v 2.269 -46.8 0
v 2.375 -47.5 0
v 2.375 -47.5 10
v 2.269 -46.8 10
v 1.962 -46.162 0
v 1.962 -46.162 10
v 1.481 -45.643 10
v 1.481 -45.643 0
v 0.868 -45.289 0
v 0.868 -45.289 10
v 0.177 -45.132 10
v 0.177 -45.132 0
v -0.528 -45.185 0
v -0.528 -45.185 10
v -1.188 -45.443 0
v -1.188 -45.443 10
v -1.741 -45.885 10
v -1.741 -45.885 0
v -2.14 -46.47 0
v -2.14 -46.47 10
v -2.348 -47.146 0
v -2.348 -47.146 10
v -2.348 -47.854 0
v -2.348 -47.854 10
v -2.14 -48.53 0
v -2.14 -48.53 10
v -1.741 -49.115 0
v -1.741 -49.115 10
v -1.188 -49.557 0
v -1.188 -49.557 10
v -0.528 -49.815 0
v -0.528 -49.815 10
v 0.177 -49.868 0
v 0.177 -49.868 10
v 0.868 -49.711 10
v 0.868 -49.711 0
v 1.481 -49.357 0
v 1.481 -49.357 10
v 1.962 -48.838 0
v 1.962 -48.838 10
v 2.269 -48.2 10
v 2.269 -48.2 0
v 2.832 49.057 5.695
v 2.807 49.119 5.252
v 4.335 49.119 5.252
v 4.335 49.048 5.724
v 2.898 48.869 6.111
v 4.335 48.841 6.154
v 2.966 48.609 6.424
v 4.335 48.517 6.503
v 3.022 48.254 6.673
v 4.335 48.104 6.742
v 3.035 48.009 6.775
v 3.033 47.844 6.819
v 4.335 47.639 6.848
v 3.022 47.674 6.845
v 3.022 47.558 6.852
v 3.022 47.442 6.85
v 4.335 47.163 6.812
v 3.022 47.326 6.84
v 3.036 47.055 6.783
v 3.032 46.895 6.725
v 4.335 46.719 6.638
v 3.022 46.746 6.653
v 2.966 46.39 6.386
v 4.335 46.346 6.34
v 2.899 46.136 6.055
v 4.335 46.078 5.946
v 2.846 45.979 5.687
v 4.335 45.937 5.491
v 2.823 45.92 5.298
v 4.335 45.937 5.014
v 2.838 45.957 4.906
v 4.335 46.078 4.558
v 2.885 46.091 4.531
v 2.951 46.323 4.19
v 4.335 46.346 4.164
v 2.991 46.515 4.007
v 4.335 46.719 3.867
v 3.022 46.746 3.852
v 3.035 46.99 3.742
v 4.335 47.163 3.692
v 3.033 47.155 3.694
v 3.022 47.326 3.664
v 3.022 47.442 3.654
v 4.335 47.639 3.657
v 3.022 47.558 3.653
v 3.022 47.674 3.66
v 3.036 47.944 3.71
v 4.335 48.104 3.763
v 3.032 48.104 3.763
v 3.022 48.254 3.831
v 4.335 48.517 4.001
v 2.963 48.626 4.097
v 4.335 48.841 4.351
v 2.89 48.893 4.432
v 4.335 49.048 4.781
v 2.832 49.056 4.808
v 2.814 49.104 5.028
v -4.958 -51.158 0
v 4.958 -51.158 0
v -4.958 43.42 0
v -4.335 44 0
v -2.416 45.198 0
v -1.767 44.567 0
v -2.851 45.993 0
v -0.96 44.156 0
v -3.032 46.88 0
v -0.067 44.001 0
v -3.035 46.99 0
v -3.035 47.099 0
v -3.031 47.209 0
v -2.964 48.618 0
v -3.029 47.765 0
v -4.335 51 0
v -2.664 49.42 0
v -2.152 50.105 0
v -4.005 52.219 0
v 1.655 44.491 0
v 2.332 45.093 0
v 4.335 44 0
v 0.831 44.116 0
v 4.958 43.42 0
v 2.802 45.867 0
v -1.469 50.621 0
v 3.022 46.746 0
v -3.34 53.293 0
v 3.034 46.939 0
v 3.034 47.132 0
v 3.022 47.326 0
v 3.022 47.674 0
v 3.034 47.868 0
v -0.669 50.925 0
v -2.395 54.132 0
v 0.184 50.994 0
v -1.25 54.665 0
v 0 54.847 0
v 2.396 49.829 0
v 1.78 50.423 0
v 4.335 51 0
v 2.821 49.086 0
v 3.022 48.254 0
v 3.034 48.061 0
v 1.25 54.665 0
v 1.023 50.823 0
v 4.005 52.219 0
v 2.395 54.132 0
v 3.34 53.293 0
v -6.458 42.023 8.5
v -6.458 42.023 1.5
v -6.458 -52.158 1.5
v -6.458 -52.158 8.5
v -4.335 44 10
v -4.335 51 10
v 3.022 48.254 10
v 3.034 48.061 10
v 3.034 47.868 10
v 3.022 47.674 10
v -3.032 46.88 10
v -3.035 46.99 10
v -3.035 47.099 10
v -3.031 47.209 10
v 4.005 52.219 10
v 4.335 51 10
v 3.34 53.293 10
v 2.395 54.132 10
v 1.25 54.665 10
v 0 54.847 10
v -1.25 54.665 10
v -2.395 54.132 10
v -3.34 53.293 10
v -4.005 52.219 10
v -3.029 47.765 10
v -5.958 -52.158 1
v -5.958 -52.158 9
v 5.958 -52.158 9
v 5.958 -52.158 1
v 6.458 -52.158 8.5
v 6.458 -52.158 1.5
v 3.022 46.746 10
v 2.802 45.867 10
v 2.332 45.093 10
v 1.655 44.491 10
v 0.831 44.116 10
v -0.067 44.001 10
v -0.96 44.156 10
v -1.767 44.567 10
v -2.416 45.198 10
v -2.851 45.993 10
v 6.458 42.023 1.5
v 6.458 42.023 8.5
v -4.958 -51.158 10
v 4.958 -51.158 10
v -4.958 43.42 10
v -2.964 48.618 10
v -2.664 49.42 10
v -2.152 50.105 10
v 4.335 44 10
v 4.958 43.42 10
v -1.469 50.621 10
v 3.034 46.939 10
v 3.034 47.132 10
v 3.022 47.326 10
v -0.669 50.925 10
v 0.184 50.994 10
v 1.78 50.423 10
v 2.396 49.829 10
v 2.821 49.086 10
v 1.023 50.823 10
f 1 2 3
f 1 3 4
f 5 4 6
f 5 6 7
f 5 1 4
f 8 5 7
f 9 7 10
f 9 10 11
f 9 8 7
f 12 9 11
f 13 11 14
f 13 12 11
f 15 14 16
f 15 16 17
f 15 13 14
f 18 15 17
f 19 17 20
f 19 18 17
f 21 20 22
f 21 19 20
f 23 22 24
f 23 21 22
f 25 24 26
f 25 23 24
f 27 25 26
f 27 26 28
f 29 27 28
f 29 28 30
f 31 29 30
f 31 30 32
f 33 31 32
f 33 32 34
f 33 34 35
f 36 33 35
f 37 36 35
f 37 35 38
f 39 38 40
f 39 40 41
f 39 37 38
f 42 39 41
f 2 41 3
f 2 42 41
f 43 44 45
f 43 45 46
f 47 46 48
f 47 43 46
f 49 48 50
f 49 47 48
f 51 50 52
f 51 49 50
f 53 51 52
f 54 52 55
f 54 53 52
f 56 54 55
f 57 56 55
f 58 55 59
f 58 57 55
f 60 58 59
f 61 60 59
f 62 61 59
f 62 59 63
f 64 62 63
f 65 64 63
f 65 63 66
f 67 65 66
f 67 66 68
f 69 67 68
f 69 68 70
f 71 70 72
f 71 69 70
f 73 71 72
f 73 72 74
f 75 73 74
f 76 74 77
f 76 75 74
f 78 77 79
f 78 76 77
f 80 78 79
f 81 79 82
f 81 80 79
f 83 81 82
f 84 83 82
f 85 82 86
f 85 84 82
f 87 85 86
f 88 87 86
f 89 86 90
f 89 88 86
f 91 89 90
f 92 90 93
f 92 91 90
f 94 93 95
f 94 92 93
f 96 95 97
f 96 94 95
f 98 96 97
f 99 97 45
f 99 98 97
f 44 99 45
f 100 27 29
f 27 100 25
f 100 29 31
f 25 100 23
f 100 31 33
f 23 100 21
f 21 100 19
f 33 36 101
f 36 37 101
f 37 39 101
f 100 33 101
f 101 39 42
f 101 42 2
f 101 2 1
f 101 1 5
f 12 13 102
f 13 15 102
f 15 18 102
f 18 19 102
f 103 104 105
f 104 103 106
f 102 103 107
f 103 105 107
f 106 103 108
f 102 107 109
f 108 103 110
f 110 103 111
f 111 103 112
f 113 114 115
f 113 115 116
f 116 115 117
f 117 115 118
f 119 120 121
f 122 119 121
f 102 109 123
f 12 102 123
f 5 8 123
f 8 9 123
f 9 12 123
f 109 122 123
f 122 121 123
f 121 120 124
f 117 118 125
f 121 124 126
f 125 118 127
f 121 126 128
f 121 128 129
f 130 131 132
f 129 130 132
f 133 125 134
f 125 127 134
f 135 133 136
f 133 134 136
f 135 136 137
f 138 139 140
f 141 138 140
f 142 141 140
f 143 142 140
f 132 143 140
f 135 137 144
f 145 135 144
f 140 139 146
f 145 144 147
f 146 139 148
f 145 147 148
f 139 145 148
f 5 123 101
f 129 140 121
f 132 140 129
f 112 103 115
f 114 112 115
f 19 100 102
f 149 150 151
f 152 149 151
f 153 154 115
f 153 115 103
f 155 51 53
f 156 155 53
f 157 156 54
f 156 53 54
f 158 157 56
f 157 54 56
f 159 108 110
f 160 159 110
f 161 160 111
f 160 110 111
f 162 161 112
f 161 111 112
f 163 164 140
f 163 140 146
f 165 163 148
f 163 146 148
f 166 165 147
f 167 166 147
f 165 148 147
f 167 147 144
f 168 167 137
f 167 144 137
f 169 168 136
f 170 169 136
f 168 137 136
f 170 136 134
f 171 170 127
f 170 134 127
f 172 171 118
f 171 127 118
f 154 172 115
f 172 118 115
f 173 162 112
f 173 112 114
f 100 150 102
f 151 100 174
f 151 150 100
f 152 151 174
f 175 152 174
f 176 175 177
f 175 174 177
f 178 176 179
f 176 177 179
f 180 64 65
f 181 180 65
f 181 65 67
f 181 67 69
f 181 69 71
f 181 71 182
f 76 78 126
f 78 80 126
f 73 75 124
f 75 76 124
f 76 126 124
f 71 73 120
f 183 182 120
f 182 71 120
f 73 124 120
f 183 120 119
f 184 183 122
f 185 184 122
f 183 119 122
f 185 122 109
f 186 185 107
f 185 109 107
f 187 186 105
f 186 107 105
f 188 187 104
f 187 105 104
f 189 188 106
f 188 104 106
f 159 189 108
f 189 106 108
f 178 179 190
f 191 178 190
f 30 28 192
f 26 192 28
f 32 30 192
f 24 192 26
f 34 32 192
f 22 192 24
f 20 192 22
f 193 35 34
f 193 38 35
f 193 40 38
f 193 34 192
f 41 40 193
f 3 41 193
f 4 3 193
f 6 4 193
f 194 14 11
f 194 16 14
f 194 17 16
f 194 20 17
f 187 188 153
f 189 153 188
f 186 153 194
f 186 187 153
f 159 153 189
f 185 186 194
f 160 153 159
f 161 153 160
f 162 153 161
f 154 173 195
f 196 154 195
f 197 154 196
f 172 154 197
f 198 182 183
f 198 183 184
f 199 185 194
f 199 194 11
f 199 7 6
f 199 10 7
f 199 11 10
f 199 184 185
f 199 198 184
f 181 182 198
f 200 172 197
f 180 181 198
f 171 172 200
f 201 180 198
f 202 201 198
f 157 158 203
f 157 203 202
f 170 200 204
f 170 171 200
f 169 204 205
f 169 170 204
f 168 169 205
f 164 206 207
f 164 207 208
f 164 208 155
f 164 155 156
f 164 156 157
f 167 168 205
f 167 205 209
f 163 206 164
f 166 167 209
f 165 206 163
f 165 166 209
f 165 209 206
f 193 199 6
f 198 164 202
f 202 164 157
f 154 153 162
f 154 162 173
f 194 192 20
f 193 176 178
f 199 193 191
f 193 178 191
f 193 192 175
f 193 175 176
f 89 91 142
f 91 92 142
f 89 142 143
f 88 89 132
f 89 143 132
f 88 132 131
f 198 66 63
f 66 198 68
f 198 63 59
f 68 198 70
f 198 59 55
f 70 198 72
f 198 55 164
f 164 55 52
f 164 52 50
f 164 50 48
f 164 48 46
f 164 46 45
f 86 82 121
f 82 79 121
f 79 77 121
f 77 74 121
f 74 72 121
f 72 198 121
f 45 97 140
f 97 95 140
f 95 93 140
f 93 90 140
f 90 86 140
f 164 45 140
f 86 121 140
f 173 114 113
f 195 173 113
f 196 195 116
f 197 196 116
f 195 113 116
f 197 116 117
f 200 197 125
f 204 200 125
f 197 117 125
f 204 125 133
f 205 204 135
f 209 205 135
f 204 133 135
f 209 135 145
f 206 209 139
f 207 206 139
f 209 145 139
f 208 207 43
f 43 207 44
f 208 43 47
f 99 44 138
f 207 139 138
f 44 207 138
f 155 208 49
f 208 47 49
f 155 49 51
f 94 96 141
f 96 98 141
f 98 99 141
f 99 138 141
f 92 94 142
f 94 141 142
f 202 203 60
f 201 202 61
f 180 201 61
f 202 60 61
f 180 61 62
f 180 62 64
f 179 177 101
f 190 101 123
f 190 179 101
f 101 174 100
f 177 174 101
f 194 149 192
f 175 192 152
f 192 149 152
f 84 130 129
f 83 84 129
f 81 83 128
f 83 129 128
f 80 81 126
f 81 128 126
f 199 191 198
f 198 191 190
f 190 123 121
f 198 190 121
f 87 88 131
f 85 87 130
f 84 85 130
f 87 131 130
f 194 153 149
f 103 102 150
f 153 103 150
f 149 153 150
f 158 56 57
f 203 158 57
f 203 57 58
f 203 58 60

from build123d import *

# Parameters (mm, degrees)
F0_R     = 2.375
F1_DEPTH = 10
F2_R     = 1.6
F3_DEPTH = 25.4
F4_SIZE  = 1.5
F5_SIZE  = 1


with BuildPart() as f1:
    # F0 (on Top) → F1 (new body)
    with BuildSketch(Plane.XY):
        with BuildLine():
            ThreePointArc((4.334937, 51), (0, 54.847421), (-4.334937, 51))
            Line((-4.334937, 51), (-4.334937, 44))
            Line((-4.334937, 44), (-6.457987, 42.022876))
            Line((-6.457987, 42.022876), (-6.457987, -52.157663))
            Line((-6.457987, -52.157663), (0, -52.157663))
            Line((0, -52.157663), (6.457987, -52.157663))
            Line((6.457987, -52.157663), (6.457987, 42.022876))
            Line((6.457987, 42.022876), (4.334937, 44))
            Line((4.334937, 44), (4.334937, 51))
        make_face()
        with Locations((0, -47.5)):
            Circle(F0_R, mode=Mode.SUBTRACT)
        with BuildLine():
            ThreePointArc((3.021839, 48.254199), (3.035714, 47.964286), (3.021839, 47.674372))
            Line((3.021839, 47.674372), (3.021839, 47.325628))
            ThreePointArc((3.021839, 47.325628), (3.035714, 47.035714), (3.021839, 46.745801))
            ThreePointArc((3.021839, 46.745801), (-0.06736, 44.000747), (-3.031726, 46.880157))
            ThreePointArc((-3.031726, 46.880157), (-3.035701, 47.044547), (-3.03077, 47.208911))
            Line((-3.03077, 47.208911), (-3.029152, 47.76479))
            ThreePointArc((-3.029152, 47.76479), (-0.244732, 50.990119), (3.021839, 48.254199))
        make_face(mode=Mode.SUBTRACT)
    extrude(amount=F1_DEPTH)

    # F2 (on Right) → F3 (cut)
    with BuildSketch(Plane.YZ):
        with Locations((47.519322, 5.252215)):
            Circle(F2_R)
    extrude(amount=F3_DEPTH, mode=Mode.SUBTRACT)

    # F4
    f4_edges = [f1.edges().sort_by_distance(p)[0] for p in [
        (6.457987, -5.067393, 10),
        (-6.457987, -5.067393, 10),
        (6.457987, -5.067393, 0),
        (-6.457987, -5.067393, 0),
    ]]
    chamfer(f4_edges, length=F4_SIZE)

    # F5
    f5_edges = [f1.edges().sort_by_distance(p)[0] for p in [
        (0, -52.157663, 0),
        (0, -52.157663, 10),
    ]]
    chamfer(f5_edges, length=F5_SIZE)


solid = f1.part
